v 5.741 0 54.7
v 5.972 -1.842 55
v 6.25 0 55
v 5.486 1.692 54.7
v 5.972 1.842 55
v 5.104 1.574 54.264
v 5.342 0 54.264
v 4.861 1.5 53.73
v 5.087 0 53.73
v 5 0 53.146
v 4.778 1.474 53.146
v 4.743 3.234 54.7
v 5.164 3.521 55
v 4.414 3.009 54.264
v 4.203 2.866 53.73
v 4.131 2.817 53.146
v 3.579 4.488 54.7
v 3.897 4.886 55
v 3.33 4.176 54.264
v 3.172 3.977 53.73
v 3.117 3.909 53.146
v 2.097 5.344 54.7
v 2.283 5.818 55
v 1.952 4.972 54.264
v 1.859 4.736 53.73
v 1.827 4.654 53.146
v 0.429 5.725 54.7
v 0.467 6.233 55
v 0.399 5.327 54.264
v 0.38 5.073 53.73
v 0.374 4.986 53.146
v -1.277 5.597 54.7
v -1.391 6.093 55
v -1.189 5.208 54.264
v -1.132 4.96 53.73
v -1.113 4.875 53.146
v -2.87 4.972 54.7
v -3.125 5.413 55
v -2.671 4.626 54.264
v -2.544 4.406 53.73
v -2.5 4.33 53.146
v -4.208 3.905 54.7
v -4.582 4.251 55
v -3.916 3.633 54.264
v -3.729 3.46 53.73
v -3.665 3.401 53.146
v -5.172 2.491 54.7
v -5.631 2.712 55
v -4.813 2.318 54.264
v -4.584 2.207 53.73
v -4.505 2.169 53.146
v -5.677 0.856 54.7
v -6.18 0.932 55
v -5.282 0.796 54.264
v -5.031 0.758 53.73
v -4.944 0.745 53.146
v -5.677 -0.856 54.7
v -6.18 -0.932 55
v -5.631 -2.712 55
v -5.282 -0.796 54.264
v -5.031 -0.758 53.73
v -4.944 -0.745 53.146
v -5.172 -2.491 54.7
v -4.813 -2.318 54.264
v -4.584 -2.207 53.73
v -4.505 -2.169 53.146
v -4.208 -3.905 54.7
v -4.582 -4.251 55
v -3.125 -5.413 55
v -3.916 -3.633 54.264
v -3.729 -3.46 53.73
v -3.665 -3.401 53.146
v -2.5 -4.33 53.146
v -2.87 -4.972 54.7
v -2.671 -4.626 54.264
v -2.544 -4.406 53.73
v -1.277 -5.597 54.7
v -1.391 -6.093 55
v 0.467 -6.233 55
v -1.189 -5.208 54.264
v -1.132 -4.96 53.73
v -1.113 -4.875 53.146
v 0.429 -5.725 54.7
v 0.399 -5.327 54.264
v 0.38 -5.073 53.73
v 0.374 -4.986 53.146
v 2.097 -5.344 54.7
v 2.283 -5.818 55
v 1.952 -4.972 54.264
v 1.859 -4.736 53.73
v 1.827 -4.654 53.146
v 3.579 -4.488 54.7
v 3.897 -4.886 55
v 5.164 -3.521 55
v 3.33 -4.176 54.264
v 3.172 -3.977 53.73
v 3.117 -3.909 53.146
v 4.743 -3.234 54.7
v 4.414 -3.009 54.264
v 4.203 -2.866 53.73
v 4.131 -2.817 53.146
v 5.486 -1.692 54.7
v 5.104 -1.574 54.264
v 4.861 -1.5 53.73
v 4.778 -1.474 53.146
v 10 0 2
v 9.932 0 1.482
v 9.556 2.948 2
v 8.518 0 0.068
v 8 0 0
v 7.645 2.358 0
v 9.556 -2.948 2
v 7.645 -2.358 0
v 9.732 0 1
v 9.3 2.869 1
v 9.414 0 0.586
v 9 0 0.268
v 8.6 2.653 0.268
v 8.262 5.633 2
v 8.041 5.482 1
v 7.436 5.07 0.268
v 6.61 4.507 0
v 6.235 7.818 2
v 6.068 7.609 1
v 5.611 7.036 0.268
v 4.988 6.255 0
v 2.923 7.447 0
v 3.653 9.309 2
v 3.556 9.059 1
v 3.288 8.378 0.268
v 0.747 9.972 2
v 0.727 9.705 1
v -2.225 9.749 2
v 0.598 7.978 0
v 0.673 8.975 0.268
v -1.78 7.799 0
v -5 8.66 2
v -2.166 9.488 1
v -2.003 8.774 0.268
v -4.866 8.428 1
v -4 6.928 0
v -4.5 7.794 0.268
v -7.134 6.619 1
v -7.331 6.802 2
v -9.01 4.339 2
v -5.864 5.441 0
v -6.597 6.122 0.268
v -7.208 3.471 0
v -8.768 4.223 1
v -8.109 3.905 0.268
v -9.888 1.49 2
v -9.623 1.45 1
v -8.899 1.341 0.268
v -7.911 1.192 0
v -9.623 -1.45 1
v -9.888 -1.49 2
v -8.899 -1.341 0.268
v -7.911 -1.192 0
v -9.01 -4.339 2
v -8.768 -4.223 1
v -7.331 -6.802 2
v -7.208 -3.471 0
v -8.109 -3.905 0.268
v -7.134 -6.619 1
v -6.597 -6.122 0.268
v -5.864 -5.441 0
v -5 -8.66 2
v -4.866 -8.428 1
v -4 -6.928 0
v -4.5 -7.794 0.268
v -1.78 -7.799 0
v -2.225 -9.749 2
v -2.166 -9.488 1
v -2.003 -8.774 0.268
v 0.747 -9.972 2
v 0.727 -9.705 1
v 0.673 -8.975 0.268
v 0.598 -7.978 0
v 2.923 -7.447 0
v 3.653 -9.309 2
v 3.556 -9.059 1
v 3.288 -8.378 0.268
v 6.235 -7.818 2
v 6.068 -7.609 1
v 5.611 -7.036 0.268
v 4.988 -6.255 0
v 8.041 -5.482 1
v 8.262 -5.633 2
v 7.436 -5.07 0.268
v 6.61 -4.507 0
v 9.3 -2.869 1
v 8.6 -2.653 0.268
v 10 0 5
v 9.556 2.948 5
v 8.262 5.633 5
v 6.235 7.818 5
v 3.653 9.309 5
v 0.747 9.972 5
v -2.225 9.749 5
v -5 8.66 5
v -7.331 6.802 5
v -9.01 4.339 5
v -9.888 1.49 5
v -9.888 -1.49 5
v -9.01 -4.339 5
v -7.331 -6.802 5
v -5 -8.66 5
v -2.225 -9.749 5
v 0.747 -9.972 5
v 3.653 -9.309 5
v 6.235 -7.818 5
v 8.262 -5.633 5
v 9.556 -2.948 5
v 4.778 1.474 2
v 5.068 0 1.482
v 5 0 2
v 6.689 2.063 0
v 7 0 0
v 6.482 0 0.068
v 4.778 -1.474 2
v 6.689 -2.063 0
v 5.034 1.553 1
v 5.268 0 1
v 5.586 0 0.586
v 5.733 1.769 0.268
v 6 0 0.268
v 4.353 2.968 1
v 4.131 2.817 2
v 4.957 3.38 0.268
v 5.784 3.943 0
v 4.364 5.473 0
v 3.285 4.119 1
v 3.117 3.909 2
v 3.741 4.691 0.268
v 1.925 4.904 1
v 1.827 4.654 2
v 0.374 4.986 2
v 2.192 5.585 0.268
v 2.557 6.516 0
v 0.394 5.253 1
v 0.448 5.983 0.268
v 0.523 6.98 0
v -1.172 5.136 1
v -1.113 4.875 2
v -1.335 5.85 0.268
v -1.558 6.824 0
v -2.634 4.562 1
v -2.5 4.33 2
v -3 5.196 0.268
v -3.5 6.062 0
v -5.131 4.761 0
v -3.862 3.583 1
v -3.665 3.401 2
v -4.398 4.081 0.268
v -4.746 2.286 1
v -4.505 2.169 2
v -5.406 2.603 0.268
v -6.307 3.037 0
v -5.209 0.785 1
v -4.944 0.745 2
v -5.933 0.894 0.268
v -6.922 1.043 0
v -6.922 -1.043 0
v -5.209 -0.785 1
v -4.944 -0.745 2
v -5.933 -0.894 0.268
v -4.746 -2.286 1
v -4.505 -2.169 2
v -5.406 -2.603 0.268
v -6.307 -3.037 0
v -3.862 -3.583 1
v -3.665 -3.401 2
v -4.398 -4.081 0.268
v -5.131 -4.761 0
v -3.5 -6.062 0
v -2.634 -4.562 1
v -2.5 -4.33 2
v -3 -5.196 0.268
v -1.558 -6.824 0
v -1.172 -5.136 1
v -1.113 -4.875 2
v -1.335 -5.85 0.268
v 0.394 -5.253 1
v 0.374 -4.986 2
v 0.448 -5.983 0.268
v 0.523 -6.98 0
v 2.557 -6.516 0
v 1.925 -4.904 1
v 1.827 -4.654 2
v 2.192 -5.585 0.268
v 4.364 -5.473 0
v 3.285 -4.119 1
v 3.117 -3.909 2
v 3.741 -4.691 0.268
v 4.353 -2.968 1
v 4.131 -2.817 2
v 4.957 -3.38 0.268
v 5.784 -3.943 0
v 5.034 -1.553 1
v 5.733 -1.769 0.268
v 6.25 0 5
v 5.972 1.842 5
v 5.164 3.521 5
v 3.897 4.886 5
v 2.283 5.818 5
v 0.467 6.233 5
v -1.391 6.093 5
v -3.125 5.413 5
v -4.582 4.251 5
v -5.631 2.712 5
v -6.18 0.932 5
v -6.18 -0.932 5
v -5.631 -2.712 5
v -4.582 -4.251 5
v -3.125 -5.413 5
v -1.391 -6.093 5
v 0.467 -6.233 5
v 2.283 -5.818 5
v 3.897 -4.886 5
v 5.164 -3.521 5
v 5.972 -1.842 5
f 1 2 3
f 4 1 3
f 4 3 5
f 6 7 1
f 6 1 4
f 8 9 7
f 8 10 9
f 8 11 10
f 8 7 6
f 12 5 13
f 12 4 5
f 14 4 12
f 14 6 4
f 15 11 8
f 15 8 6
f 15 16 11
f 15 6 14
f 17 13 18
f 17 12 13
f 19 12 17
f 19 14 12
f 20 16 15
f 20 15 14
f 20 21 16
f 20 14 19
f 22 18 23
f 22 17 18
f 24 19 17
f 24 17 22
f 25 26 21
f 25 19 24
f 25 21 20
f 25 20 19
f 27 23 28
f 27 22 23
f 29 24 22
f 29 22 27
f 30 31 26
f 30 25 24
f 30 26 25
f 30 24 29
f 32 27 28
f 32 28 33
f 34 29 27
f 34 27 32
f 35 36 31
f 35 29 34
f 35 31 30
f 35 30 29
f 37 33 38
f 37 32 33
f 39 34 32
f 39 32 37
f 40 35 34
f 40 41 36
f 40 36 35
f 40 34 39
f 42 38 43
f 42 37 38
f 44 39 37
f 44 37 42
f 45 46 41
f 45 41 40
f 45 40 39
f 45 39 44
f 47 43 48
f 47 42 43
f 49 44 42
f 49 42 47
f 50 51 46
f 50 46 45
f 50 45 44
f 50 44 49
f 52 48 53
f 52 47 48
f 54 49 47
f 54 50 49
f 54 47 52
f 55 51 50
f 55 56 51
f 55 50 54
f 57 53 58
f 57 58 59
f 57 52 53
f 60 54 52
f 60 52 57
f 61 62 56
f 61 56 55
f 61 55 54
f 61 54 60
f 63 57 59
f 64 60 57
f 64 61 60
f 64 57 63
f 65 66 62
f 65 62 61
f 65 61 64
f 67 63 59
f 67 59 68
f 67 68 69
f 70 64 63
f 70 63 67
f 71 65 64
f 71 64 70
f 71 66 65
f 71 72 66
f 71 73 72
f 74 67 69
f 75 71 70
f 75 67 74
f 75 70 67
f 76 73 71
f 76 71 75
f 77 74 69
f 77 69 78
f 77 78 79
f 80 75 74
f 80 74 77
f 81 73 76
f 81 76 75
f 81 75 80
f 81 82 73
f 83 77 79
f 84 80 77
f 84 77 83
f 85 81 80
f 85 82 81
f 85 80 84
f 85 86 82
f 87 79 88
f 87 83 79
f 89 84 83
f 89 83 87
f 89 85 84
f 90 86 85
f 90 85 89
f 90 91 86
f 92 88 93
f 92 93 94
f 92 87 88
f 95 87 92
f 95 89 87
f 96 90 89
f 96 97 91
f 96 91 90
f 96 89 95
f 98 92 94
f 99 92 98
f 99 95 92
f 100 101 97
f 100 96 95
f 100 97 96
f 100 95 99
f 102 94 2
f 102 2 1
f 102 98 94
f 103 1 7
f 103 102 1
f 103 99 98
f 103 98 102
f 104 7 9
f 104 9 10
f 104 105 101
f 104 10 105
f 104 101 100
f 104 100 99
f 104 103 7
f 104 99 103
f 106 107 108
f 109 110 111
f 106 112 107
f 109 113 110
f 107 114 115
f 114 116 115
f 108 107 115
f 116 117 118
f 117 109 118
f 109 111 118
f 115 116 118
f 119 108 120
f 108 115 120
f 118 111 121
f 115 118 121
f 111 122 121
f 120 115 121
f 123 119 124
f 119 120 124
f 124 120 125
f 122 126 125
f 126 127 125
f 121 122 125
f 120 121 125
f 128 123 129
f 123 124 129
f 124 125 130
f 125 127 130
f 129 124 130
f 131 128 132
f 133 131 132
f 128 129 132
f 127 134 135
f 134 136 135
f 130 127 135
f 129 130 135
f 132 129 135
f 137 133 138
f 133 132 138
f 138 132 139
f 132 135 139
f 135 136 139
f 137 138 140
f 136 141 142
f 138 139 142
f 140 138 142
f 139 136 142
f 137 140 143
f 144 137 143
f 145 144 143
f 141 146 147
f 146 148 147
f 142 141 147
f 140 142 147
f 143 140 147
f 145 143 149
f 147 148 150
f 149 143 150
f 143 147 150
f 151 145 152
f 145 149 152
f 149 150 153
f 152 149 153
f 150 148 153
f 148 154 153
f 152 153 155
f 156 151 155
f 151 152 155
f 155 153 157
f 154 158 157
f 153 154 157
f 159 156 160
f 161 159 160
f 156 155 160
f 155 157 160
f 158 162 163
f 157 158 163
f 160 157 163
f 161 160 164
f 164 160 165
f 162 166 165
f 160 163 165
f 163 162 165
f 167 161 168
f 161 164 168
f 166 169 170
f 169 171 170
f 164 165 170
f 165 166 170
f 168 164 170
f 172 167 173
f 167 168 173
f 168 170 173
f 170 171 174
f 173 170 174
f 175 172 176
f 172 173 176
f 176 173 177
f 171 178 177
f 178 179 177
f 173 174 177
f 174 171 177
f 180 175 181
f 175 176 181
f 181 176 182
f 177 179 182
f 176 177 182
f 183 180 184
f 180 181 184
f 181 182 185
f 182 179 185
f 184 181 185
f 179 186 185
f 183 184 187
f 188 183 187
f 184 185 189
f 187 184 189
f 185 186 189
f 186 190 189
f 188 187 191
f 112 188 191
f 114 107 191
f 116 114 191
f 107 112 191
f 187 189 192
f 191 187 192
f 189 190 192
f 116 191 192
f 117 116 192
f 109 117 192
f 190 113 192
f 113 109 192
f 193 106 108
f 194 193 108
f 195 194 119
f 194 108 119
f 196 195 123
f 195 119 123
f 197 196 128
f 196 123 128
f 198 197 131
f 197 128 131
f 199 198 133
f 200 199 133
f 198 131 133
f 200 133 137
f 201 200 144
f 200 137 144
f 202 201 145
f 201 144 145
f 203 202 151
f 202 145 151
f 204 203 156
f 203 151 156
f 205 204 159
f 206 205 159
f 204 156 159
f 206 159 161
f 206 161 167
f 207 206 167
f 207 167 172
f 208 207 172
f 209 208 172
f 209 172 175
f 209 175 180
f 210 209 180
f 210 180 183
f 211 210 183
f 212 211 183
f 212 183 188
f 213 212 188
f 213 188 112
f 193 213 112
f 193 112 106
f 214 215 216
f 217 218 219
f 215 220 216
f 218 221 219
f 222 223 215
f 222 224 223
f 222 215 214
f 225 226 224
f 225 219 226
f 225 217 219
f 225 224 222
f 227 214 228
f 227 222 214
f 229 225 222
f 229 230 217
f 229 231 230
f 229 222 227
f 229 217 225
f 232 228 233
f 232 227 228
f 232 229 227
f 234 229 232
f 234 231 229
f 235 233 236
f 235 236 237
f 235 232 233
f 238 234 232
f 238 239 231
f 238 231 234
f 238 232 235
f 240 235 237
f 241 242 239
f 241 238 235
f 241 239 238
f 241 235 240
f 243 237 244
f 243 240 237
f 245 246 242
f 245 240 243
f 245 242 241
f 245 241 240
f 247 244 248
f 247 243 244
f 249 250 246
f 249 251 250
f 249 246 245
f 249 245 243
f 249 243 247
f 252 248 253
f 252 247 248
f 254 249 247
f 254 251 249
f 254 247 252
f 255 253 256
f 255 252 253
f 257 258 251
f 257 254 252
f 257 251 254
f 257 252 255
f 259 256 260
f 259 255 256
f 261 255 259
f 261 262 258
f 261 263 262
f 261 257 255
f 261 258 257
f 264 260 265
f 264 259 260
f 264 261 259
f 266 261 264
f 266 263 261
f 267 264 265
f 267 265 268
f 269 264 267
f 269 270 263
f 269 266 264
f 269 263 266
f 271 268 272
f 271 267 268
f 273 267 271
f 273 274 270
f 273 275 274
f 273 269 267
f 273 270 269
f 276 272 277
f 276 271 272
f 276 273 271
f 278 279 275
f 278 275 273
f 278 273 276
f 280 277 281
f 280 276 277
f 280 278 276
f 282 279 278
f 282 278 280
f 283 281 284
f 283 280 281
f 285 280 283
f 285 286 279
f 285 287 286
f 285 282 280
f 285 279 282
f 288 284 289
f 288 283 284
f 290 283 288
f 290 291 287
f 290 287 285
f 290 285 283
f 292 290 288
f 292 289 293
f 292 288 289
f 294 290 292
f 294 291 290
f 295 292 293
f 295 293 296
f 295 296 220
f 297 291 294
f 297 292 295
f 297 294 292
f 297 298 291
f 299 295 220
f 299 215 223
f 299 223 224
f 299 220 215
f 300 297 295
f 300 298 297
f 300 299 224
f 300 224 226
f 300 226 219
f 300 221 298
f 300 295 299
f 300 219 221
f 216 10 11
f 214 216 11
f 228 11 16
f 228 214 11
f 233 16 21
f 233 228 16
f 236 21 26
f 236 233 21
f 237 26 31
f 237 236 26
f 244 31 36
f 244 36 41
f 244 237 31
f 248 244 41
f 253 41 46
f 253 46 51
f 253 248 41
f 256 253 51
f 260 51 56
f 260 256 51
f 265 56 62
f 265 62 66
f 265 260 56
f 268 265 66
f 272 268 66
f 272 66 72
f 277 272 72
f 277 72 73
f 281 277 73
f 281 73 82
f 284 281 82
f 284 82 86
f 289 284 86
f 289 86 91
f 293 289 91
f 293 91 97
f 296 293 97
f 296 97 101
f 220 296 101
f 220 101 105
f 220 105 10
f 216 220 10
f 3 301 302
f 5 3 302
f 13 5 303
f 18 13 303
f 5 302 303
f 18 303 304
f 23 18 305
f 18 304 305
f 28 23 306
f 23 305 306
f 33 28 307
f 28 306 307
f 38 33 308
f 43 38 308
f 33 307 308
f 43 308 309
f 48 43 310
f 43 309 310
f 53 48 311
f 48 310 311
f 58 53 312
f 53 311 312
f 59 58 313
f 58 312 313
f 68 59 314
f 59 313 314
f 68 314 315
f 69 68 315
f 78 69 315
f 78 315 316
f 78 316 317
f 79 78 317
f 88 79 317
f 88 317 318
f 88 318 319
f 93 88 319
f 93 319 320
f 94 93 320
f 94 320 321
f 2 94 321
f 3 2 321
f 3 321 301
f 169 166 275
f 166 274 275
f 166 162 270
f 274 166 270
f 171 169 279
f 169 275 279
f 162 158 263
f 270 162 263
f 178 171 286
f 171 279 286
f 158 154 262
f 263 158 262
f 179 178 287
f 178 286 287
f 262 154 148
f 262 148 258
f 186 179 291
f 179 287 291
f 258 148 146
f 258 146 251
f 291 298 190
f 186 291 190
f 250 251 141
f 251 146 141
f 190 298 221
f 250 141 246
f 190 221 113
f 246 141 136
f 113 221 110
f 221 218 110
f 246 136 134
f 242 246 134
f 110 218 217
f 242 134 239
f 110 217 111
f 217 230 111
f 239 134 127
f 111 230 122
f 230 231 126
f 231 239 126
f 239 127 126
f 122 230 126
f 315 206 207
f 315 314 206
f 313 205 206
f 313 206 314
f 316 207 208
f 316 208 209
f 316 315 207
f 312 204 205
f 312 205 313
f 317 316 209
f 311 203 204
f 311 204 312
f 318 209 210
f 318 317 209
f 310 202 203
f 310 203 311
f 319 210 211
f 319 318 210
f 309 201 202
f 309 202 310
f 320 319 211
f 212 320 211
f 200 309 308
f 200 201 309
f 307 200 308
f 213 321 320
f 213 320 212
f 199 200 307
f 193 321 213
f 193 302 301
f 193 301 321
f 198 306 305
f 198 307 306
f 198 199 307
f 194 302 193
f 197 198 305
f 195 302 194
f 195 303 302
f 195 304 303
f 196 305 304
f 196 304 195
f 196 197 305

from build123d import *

# Parameters (mm, degrees)
F0_R     = 10
F0_R_2   = 6.25
F1_DEPTH = 5
F0_R_3   = 5
F2_DEPTH = 55
F3_DEPTH = 51


# Not quite as in the source:
# - a fillet or chamfer that OpenCascade refuses, or shapes differently, is made with other operations: its cross-section is extruded or revolved along the edge and cut away or added


with BuildPart() as f1:
    # F0 (on Top) → F1 (new body)
    with BuildSketch(Plane.XY):
        Circle(F0_R)
        Circle(F0_R_2, mode=Mode.SUBTRACT)
    extrude(amount=F1_DEPTH)

    # F0 (on Top) → F2 (join)
    with BuildSketch(Plane.XY):
        Circle(F0_R_2)
        Circle(F0_R_3, mode=Mode.SUBTRACT)
    extrude(amount=F2_DEPTH)

    # F0 (on Top) → F3 (cut)
    with BuildSketch(Plane.XY):
        Circle(F0_R_3)
    extrude(amount=F3_DEPTH, mode=Mode.SUBTRACT)

    # F4: fillet of radius 2 on 3 edges, made by hand

    # F4_s1 → F4_t2 (revolve, cut)
    with BuildSketch(Plane.XZ):
        with BuildLine():
            ThreePointArc((5, 2), (5.5857864376, 0.5857864376), (7, 0))
            Line((7, 0), (5, 0))
            Line((5, 0), (5, 2))
        make_face()
    revolve(axis=Axis((0, 0, 0), (0, 0, 1)), mode=Mode.SUBTRACT)

    # F4_s3 → F4_t4 (revolve, cut)
    with BuildSketch(Plane.XZ):
        with BuildLine():
            ThreePointArc((6.25, 55), (5.3416876048, 54.263984367), (5, 53.1459503782))
            Line((5, 53.1459503782), (5, 55))
            Line((5, 55), (6.25, 55))
        make_face()
    revolve(axis=Axis((0, 0, 55), (0, 0, 1)), mode=Mode.SUBTRACT)

    # F4_s5 → F4_t6 (revolve, cut)
    with BuildSketch(Plane.XZ):
        with BuildLine():
            ThreePointArc((10, 2), (9.4142135624, 0.5857864376), (8, 0))
            Line((8, 0), (10, 0))
            Line((10, 0), (10, 2))
        make_face()
    revolve(axis=Axis((0, 0, 0), (0, 0, 1)), mode=Mode.SUBTRACT)


solid = f1.part
